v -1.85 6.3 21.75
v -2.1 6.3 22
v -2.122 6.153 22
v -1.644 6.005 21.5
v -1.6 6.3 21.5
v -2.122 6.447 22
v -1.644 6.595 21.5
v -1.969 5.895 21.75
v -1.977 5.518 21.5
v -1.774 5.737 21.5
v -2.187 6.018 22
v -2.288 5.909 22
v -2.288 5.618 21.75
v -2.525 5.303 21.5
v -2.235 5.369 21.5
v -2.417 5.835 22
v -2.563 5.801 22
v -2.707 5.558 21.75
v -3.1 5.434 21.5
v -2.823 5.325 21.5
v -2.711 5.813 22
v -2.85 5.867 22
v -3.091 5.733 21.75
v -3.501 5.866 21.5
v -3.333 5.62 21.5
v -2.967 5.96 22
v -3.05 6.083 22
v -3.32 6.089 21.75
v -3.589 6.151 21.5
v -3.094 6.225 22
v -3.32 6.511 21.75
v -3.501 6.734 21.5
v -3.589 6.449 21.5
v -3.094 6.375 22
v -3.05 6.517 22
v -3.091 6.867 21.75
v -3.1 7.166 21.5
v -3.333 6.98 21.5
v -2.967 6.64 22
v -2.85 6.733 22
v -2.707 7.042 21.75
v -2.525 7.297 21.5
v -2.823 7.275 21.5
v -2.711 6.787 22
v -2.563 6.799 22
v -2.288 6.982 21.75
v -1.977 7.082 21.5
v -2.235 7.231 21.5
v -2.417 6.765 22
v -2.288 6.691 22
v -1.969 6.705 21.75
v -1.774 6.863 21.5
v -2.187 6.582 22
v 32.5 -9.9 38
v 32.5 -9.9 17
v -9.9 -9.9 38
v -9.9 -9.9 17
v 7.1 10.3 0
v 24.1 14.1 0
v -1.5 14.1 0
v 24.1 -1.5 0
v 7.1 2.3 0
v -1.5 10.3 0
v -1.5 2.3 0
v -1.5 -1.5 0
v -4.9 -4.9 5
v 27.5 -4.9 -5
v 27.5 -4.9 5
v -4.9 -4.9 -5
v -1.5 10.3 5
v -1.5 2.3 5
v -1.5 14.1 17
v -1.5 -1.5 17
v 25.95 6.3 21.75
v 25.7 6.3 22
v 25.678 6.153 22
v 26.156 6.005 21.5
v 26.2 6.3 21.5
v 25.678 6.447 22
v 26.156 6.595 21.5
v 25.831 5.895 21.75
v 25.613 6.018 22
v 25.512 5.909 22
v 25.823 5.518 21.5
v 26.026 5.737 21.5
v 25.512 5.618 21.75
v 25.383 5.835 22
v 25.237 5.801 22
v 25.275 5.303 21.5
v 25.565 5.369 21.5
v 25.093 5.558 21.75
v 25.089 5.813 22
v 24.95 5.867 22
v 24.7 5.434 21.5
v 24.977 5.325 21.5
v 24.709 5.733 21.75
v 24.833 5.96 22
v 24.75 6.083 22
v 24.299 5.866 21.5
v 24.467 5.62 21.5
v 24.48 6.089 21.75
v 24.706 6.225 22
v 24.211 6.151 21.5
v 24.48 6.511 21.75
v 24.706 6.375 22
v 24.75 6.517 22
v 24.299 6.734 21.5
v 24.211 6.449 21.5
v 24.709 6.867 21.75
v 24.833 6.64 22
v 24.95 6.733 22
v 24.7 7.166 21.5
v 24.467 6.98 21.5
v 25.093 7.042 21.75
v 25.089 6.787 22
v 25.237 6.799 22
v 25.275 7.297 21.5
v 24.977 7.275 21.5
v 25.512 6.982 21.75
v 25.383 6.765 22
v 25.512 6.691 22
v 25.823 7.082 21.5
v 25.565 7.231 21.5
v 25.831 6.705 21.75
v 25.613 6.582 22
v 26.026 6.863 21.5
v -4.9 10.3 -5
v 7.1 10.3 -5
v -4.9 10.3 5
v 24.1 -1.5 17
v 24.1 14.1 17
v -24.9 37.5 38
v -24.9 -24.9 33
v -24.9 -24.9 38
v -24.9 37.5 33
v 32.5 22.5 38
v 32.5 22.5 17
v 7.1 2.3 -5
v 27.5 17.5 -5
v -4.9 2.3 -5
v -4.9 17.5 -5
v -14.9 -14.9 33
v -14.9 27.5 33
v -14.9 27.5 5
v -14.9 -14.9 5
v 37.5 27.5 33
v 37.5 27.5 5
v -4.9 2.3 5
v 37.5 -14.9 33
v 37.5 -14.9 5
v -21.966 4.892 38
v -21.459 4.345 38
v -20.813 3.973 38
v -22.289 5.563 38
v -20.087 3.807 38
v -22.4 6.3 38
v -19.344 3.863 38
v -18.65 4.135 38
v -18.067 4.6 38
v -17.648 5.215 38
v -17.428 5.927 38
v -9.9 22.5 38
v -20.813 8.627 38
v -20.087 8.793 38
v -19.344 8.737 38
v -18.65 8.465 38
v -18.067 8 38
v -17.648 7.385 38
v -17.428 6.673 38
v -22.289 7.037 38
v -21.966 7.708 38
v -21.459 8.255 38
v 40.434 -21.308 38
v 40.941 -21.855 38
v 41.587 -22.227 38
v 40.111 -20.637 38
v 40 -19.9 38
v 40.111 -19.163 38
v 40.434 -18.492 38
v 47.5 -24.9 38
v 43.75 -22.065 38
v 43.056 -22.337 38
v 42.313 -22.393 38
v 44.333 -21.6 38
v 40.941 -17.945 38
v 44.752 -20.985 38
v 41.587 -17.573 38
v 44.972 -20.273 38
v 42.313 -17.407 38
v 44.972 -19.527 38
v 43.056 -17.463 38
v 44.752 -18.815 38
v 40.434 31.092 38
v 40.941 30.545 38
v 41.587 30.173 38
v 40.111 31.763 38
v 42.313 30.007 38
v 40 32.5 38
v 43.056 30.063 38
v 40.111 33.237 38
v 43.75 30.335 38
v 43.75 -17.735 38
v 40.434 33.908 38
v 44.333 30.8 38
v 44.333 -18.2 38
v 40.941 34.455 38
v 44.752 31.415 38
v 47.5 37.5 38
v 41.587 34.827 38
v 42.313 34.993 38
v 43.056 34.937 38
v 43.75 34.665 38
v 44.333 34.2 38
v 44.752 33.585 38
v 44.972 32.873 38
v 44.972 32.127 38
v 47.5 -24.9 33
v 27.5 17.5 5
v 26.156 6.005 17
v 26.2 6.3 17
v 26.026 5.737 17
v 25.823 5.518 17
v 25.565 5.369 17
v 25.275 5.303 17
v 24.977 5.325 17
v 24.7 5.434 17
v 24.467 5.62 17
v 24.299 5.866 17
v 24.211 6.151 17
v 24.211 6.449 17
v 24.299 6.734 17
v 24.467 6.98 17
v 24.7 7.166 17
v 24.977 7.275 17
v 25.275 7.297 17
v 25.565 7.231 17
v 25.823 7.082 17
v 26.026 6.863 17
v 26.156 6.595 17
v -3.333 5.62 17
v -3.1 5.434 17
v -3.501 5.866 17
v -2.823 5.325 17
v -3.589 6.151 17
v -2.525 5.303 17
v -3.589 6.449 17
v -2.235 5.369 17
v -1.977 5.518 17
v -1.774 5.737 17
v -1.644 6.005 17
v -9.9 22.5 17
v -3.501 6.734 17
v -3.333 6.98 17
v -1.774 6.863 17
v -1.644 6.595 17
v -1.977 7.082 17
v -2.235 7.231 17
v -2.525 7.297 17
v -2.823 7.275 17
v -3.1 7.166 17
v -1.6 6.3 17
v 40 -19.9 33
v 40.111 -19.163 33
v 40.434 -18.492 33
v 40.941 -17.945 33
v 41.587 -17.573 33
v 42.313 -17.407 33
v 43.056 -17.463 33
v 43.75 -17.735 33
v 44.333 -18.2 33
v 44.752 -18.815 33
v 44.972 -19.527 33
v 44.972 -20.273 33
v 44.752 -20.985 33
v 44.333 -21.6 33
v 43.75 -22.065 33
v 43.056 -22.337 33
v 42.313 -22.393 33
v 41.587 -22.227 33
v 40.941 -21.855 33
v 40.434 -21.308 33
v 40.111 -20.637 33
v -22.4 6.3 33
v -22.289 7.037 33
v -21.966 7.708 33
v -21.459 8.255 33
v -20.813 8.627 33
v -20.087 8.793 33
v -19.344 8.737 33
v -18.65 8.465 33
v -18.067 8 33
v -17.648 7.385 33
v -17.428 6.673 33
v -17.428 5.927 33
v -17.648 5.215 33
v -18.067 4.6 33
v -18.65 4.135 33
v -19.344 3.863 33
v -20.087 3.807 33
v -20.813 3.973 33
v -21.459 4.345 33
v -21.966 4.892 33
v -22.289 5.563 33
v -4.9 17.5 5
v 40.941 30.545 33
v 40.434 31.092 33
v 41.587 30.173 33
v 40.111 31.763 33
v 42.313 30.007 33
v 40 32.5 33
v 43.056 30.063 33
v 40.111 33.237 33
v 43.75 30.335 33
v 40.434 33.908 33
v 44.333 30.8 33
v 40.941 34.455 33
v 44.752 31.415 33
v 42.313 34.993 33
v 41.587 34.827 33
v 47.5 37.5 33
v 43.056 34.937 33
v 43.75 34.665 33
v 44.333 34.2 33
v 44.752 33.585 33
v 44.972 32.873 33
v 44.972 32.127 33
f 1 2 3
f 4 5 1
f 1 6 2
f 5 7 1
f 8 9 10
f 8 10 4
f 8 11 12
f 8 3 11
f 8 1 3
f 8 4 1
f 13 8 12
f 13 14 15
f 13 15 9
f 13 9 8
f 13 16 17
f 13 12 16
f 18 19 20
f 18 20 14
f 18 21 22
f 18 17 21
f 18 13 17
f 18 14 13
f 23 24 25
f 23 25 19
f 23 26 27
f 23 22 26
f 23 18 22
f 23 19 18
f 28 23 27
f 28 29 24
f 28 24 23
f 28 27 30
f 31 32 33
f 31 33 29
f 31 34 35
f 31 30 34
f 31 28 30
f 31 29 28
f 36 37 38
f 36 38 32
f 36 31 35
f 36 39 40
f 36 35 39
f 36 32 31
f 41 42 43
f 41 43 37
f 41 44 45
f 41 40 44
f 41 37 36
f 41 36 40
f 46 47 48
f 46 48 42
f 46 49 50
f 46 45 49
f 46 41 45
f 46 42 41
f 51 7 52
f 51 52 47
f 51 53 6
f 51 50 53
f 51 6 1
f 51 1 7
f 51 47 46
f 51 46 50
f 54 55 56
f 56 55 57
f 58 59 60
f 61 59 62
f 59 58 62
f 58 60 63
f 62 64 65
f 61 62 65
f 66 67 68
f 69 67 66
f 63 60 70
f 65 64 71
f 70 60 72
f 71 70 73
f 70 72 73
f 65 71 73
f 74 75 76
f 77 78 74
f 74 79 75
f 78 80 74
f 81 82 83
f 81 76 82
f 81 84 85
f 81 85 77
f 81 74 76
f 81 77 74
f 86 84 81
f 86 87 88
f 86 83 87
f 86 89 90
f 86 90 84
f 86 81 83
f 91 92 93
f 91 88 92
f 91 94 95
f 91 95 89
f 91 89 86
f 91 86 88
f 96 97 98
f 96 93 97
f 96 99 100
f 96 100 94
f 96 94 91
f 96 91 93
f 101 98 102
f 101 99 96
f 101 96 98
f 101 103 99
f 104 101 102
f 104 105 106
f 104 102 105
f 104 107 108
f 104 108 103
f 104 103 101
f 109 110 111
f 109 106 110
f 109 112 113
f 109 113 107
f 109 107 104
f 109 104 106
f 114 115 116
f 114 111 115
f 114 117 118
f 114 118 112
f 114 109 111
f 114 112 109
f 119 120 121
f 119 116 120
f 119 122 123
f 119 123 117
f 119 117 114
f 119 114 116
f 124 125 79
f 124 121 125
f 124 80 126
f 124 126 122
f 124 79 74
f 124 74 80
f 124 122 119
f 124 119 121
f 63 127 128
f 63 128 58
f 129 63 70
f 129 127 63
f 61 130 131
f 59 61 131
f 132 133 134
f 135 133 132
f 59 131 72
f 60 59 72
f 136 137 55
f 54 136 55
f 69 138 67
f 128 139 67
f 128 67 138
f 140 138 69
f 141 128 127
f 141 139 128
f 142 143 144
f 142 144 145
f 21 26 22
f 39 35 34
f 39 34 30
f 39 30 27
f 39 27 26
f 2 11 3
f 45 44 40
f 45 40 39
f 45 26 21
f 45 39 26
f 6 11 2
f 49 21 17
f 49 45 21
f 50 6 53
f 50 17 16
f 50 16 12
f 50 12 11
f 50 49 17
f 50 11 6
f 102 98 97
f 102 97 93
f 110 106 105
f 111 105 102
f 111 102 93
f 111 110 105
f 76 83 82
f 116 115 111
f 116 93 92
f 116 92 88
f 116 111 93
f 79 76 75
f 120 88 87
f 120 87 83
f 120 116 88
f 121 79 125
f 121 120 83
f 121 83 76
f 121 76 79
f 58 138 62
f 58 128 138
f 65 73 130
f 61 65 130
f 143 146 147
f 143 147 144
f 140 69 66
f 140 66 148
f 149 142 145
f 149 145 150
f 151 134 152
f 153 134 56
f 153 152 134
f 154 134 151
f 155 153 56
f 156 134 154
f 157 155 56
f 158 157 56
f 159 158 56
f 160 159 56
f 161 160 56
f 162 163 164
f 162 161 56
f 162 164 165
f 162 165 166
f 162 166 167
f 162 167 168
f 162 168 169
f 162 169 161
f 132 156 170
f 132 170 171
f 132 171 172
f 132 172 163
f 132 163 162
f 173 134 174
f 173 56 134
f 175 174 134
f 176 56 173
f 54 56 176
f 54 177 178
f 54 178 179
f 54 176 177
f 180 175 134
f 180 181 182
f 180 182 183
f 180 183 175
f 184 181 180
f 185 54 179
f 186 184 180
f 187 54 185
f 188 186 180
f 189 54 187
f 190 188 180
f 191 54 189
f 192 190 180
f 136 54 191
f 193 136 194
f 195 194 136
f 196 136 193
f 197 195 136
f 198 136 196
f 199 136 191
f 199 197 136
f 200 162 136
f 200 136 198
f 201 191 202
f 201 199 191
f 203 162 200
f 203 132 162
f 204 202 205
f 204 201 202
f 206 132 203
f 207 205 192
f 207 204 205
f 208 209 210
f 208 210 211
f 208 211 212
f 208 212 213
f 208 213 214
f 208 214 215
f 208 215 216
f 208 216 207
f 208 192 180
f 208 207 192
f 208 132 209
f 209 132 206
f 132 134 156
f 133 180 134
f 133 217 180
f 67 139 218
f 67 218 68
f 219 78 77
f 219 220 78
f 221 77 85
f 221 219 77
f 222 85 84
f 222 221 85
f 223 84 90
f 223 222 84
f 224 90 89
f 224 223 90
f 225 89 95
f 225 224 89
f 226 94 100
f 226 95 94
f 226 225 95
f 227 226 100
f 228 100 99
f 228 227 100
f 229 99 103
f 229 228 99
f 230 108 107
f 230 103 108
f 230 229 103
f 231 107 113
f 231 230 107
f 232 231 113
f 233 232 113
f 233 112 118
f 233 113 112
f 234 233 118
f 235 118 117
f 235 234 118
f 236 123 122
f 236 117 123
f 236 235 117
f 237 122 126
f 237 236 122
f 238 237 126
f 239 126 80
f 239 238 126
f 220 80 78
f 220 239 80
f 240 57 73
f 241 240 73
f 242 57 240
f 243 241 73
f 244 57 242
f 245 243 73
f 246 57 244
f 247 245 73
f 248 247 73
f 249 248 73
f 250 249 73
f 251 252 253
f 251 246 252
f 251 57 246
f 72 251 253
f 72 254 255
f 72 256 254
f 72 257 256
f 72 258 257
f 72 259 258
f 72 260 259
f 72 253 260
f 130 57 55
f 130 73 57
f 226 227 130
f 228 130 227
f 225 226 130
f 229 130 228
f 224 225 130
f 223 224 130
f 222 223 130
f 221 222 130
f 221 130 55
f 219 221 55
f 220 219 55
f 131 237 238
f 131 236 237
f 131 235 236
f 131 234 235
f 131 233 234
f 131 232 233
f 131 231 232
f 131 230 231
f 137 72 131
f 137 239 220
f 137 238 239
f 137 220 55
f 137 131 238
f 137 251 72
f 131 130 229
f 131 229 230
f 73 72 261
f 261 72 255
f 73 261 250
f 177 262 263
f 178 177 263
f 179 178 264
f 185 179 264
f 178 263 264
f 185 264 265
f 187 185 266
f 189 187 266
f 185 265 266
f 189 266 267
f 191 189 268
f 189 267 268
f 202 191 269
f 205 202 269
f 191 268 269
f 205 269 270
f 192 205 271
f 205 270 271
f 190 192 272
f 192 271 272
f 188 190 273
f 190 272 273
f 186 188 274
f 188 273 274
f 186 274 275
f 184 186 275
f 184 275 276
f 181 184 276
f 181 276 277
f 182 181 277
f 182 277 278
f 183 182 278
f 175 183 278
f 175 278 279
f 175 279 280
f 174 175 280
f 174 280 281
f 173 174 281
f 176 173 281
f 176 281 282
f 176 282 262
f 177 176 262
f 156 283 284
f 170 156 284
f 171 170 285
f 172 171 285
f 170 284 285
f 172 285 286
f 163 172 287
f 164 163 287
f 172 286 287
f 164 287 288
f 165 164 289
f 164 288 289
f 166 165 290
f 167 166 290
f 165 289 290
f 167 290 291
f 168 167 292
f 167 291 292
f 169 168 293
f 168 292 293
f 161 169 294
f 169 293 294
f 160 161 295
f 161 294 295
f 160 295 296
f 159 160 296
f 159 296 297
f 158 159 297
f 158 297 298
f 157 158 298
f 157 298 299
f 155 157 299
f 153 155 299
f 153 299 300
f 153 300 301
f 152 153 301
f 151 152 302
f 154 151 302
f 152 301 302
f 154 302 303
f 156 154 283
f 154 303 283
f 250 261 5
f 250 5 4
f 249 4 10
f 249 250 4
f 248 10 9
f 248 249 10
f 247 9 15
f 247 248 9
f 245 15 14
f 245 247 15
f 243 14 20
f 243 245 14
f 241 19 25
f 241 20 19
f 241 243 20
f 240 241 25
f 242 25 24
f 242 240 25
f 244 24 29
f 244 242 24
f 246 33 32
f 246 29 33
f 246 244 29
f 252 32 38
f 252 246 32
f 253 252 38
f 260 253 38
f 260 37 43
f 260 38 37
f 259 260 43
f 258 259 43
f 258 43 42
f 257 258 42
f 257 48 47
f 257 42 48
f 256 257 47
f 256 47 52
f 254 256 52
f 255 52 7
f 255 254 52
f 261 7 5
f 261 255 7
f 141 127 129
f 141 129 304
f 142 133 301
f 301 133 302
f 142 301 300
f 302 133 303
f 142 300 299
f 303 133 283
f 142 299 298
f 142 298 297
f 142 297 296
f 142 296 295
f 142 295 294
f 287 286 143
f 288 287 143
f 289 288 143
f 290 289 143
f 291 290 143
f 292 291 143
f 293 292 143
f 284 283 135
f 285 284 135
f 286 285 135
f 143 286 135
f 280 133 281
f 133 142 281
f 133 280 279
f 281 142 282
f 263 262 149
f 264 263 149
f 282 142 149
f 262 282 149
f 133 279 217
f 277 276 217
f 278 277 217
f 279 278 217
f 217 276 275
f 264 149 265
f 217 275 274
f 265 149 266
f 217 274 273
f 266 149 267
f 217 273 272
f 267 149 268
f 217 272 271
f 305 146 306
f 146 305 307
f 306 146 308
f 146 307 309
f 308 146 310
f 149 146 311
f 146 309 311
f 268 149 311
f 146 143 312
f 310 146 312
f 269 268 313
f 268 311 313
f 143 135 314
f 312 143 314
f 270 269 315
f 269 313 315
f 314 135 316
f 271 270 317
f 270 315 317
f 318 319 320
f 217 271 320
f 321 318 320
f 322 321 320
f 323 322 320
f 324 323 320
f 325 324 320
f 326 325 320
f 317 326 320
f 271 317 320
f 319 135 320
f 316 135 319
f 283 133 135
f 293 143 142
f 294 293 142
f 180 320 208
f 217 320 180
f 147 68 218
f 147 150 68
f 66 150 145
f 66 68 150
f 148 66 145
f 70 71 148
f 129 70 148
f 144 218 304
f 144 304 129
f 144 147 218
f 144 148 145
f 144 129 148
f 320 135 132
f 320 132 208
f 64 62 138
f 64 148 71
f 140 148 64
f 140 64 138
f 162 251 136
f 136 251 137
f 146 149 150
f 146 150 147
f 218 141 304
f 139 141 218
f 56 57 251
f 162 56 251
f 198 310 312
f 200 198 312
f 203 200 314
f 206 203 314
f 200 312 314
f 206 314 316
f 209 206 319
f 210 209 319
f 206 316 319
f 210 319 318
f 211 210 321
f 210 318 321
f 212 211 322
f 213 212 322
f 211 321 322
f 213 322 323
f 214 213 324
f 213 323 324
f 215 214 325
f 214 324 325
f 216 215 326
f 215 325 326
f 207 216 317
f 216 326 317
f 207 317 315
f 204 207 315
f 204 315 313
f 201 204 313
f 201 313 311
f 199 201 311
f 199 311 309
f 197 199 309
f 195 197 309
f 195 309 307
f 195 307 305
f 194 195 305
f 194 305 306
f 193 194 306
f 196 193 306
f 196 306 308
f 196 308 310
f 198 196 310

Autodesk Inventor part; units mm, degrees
ref_plane "YZ Plane" through (0, 0, 0) normal (1, 0, 0) x (0, 1, 0)
ref_plane "XZ Plane" through (0, 0, 0) normal (0, 1, 0) x (-1, 0, 0)
sketch "Sketch1" plane through (0, 0, 0) normal (0, 0, 1) x (1, 0, 0)
  line L0 (0, 0) -> (22.6, 0)
  line L1 (22.6, 0) -> (22.6, 12.6)
  line L2 (22.6, 12.6) -> (0, 12.6)
  line L3 (0, 12.6) -> (0, 0)
  line L4 (-4.9, 17.5) -> (27.5, 17.5)
  line L5 (27.5, 17.5) -> (27.5, -4.9)
  line L6 (27.5, -4.9) -> (-4.9, -4.9)
  line L7 (-4.9, -4.9) -> (-4.9, 17.5)
  dimension "d0" = 22.6
  dimension "d1" = 12.6
  dimension "d2" = 4.9
extrude "Extrusion1" add sketch "Sketch1" along normal blind 17
sketch "Sketch2" plane through (0, 0, 0) normal (0, 0, -1) x (-1, 0, 0)
  line L0 (4.9, -4.9) -> (-27.5, -4.9) projected
  line L1 (-27.5, -4.9) -> (-27.5, 17.5) projected
  line L2 (-27.5, 17.5) -> (4.9, 17.5) projected
  line L3 (4.9, 17.5) -> (4.9, -4.9) projected
  point P0 (0, 0)
extrude "Extrusion2" add sketch "Sketch2" along normal blind 5
sketch "Sketch3" plane through (0, 0, 17) normal (0, 0, 1) x (1, 0, 0)
  line L0 (-4.9, -4.9) -> (27.5, -4.9) projected
  line L1 (27.5, -4.9) -> (27.5, 17.5) projected
  line L2 (27.5, 17.5) -> (-4.9, 17.5) projected
  line L3 (-4.9, 17.5) -> (-4.9, -4.9) projected
  line L4 (0, 0) -> (0, 12.6) projected
  line L5 (0, 12.6) -> (22.6, 12.6) projected
  line L6 (22.6, 12.6) -> (22.6, 0) projected
  line L7 (22.6, 0) -> (0, 0) projected
  line L8 (-9.9, -9.9) -> (32.5, -9.9)
  line L9 (32.5, -9.9) -> (32.5, 22.5)
  line L10 (32.5, 22.5) -> (-9.9, 22.5)
  line L11 (-9.9, 22.5) -> (-9.9, -9.9)
  line L12 (-4.9, 6.3) -> (-2.6, 6.3) construction
  line L13 (27.5, 17.5) -> (27.5, -4.9) projected
  line L14 (27.5, 6.3) -> (25.2, 6.3) construction
  circle A0 centre (-2.6, 6.3) radius 1
  circle A1 centre (25.2, 6.3) radius 1
  dimension "d7" = 5
  dimension "d10" = 2.3
  dimension "d11" = 2.3
  dimension "d12" = 2
  dimension "d13" = 2
extrude "Extrusion4" add sketch "Sketch3" along normal blind 5 contours A0 | A1
chamfer "Chamfer1" distance 0.5 angle 45 2 edges at (-3.6, 6.3, 22) (24.2, 6.3, 22)
ref_plane "Work Plane1" through (0, 0, 12) normal (0, 0, 1) x (1, 0, 0)
sketch "Sketch5" plane through (0, 0, 12) normal (0, 0, 1) x (1, 0, 0)
  line L0 (-4.9, -4.9) -> (27.5, -4.9) projected
  line L1 (27.5, -4.9) -> (27.5, 17.5) projected
  line L2 (27.5, 17.5) -> (-4.9, 17.5) projected
  line L3 (-4.9, 17.5) -> (-4.9, -4.9) projected
  line L4 (32.5, -9.9) -> (-9.9, -9.9)
  line L5 (-9.9, -9.9) -> (-9.9, 22.5)
  line L6 (-9.9, 22.5) -> (32.5, 22.5)
  line L7 (32.5, 22.5) -> (32.5, -9.9)
  point P0 (0, 0)
  dimension "d21" = 5
extrude "Extrusion5" add sketch "Sketch5" along normal blind 5
sketch "Sketch14" plane through (0, 0, 17) normal (0, 0, 1) x (1, 0, 0)
  line L0 (22.6, 12.6) -> (22.6, 0) projected
  line L1 (0, 12.6) -> (22.6, 12.6) projected
  line L2 (0, 0) -> (0, 12.6) projected
  line L3 (22.6, 0) -> (0, 0) projected
  line L4 (-9.9, -9.9) -> (-9.9, 22.5)
  line L5 (-9.9, 22.5) -> (32.5, 22.5)
  line L6 (32.5, 22.5) -> (32.5, -9.9)
  line L7 (32.5, -9.9) -> (-9.9, -9.9)
  line L8 (-14.9, -14.9) -> (-14.9, 27.5)
  line L9 (-14.9, 27.5) -> (37.5, 27.5)
  line L10 (37.5, 27.5) -> (37.5, -14.9)
  line L11 (37.5, -14.9) -> (-14.9, -14.9)
  dimension "d52" = 9.9
  dimension "d53" = 5
extrude "Extrusion11" add sketch "Sketch14" along normal blind 16 contours L8 L9 L10 L11
sketch "Sketch15" plane through (0, 0, 33) normal (0, 0, 1) x (1, 0, 0)
  line L0 (-14.9, 27.5) -> (-14.9, -14.9) projected
  line L1 (-14.9, -14.9) -> (37.5, -14.9) projected
  line L2 (37.5, -14.9) -> (37.5, 27.5) projected
  line L3 (37.5, 27.5) -> (-14.9, 27.5) projected
  line L4 (47.5, -24.9) -> (-24.9, -24.9)
  line L5 (-24.9, -24.9) -> (-24.9, 37.5)
  line L6 (-24.9, 37.5) -> (47.5, 37.5)
  line L7 (47.5, 37.5) -> (47.5, -24.9)
  line L8 (32.5, -9.9) -> (-9.9, -9.9) projected
  line L9 (-9.9, -9.9) -> (-9.9, 22.5) projected
  line L10 (-9.9, 22.5) -> (32.5, 22.5) projected
  line L11 (32.5, 22.5) -> (32.5, -9.9) projected
  point P0 (0, 0)
  dimension "d56" = 10
extrude "Extrusion12" add sketch "Sketch15" along normal blind 5 contours L3 L2 L1 L0 | L4 L5 L6 L7
sketch "Sketch16" plane through (0, 0, 33) normal (0, 0, -1) x (-1, 0, 0)
  line L0 (-37.5, -14.9) -> (-37.5, 27.5) projected
  line L1 (14.9, -14.9) -> (-37.5, -14.9) projected
  line L2 (14.9, 27.5) -> (14.9, -14.9) projected
  line L3 (-37.5, 27.5) -> (14.9, 27.5) projected
  line L4 (9.9, 22.5) -> (9.9, -9.9) projected
  line L5 (9.9, -9.9) -> (-32.5, -9.9) projected
  line L6 (-32.5, -9.9) -> (-32.5, 22.5) projected
  line L7 (-32.5, 22.5) -> (9.9, 22.5) projected
  line L8 (-42.5, 32.5) -> (-42.5, -19.9) construction
  line L9 (-42.5, -19.9) -> (19.9, -19.9) construction
  line L10 (19.9, -19.9) -> (19.9, 32.5) construction
  line L11 (19.9, 32.5) -> (-42.5, 32.5) construction
  circle A0 centre (19.9, 6.3) radius 2.5
  circle A1 centre (-42.5, 32.5) radius 2.5
  circle A2 centre (-42.5, -19.9) radius 2.5
  point P0 (0, 0)
  dimension "d59" = 5
  dimension "d60" = 5
  dimension "d61" = 5
  dimension "d62" = 5
extrude "Extrusion13" cut sketch "Sketch16" against normal blind 5 contours A0 | A1 | A2
sketch "Sketch17" plane through (-4.9, -4.9, -5) normal (-1, 0, 0) x (0, 0, 1)
  line L0 (-10, 15.2) -> (10, 15.2)
  line L1 (10, 15.2) -> (10, 7.2)
  line L2 (10, 7.2) -> (-10, 7.2)
  line L3 (-10, 7.2) -> (-10, 15.2)
  line L4 (0, 22.4) -> (0, 0) projected
  line L5 (-10, 15.2) -> (10, 7.2) construction
  line L6 (10, 15.2) -> (-10, 7.2) construction
  line L7 (5, 15.2) -> (5, 7.2)
  line L8 (0, 11.2) -> (5, 11.2)
  point P0 (5, 4.9)
  dimension "d65" = 20
  dimension "d66" = 8
  dimension "d67" = 5
extrude "Extrusion14" cut sketch "Sketch17" against normal blind 5 contours L0 L1 L2 L7
sketch "Sketch18" plane through (0, 0, 12) normal (0, 0, -1) x (-1, 0, 0)
  line L0 (-32.5, 22.5) -> (9.9, 22.5) projected
  line L1 (-32.5, -9.9) -> (-32.5, 22.5) projected
  line L2 (9.9, -9.9) -> (-32.5, -9.9) projected
  line L3 (9.9, 22.5) -> (9.9, -9.9) projected
  line L4 (4.9, -4.9) -> (4.9, 17.5) projected
  line L5 (-27.5, -4.9) -> (4.9, -4.9) projected
  line L6 (-27.5, 17.5) -> (-27.5, -4.9) projected
  line L7 (4.9, 17.5) -> (-27.5, 17.5) projected
  point P0 (0, 0)
extrude "Extrusion15" add sketch "Sketch18" along normal blind 7
sketch "Sketch20" plane through (-4.9, -4.9, -5) normal (-1, 0, 0) x (0, 0, 1)
  line L0 (5, 7.2) -> (0, 7.2)
  line L1 (5, 15.2) -> (10, 15.2) projected
  line L2 (5, 15.2) -> (0, 15.2)
  line L3 (0, 15.2) -> (0, 7.2)
  line L4 (5, 15.2) -> (5, 17.5) projected
  line L5 (5, 7.2) -> (5, 15.2)
  point P0 (5, 4.9)
  dimension "d74" = 10
extrude "Extrusion17" cut sketch "Sketch20" against normal blind 12
sketch "Sketch21" plane through (0, 0, 17) normal (0, 0, -1) x (-1, 0, 0)
  line L0 (-32.5, -9.9) -> (9.9, -9.9) projected
  line L1 (9.9, -9.9) -> (9.9, 22.5) projected
  line L2 (9.9, 22.5) -> (-32.5, 22.5) projected
  line L3 (-32.5, 22.5) -> (-32.5, -9.9) projected
  line L4 (0, 2.3) -> (0, 10.3) projected
  line L5 (4.9, 2.3) -> (0, 2.3) projected
  line L6 (4.9, -4.9) -> (4.9, 2.3) projected
  line L7 (-27.5, -4.9) -> (4.9, -4.9) projected
  line L8 (-27.5, 17.5) -> (-27.5, -4.9) projected
  line L9 (4.9, 17.5) -> (-27.5, 17.5) projected
  line L10 (4.9, 10.3) -> (4.9, 17.5) projected
  line L11 (4.9, 10.3) -> (0, 10.3) projected
  line L12 (-37.5, -14.9) -> (-37.5, 27.5) projected
  line L13 (14.9, -14.9) -> (-37.5, -14.9) projected
  line L14 (14.9, 27.5) -> (14.9, -14.9) projected
  line L15 (-37.5, 27.5) -> (14.9, 27.5) projected
  line L16 (9.9, 22.5) -> (9.9, -9.9) projected
  line L17 (9.9, -9.9) -> (-32.5, -9.9) projected
  line L18 (-32.5, -9.9) -> (-32.5, 22.5) projected
  line L19 (-32.5, 22.5) -> (9.9, 22.5) projected
  point P0 (0, 0)
extrude "Extrusion18" add sketch "Sketch21" along normal blind 12 contours L12 L15 L14 L13
sketch "Sketch22" plane through (0, 0, 17) normal (0, 0, 1) x (1, 0, 0)
  line L0 (0, 12.6) -> (22.6, 12.6) projected
  line L1 (22.6, 12.6) -> (22.6, 0) projected
  line L2 (22.6, 0) -> (0, 0) projected
  line L3 (0, 0) -> (0, 12.6) projected
  line L4 (24.1, 14.1) -> (-1.5, 14.1)
  line L5 (-1.5, 14.1) -> (-1.5, -1.5)
  line L6 (-1.5, -1.5) -> (24.1, -1.5)
  line L7 (24.1, -1.5) -> (24.1, 14.1)
  dimension "d79" = 1.5
extrude "Extrusion19" cut sketch "Sketch22" against normal blind 17
sketch "Sketch23" plane through (0, 0, 38) normal (0, 0, 1) x (1, 0, 0)
  circle A0 centre (-19.9, 6.3) radius 2.5 projected
  circle A1 centre (42.5, 32.5) radius 2.5 projected
  circle A2 centre (42.5, -19.9) radius 2.5 projected
  line L0 (47.5, 37.5) -> (-24.9, 37.5) projected
  line L1 (-24.9, 37.5) -> (-24.9, -24.9) projected
  line L2 (-24.9, -24.9) -> (47.5, -24.9) projected
  line L3 (47.5, -24.9) -> (47.5, 37.5) projected
  line L4 (32.5, -9.9) -> (-9.9, -9.9) projected
  line L5 (-9.9, -9.9) -> (-9.9, 22.5) projected
  line L6 (-9.9, 22.5) -> (32.5, 22.5) projected
  line L7 (32.5, 22.5) -> (32.5, -9.9) projected
  point P0 (0, 0)
equation "\"d63\" = d62"
equation "\"d68\" = d62"
properties part number "servo_holder_V2_3DPrint"
